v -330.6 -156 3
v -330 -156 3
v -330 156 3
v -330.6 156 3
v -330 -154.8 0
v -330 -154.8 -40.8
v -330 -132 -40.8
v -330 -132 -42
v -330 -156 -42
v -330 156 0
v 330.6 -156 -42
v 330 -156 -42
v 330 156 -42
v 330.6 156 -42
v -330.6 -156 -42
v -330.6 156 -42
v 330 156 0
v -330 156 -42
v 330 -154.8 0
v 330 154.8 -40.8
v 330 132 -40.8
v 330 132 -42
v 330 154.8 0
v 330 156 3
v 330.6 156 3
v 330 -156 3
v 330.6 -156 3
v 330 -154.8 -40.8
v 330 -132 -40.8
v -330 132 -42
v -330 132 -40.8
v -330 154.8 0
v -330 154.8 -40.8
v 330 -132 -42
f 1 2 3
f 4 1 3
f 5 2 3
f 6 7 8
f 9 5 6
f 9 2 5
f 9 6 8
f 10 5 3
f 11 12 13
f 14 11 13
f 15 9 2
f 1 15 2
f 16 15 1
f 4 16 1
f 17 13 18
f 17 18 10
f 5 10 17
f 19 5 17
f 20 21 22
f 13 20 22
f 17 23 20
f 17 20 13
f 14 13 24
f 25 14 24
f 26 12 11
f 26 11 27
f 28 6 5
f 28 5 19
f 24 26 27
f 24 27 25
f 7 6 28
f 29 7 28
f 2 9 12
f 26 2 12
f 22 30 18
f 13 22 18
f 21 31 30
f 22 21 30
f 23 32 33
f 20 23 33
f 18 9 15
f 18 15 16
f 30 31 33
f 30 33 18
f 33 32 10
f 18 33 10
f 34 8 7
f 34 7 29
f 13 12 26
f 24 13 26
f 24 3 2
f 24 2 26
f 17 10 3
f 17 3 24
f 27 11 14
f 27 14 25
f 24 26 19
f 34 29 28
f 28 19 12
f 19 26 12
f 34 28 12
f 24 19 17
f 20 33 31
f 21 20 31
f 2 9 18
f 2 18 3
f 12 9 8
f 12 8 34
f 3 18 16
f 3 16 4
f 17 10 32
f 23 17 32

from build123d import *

# Parameters (mm, degrees)
SKETCH_1_W            = 1100
SKETCH_1_H            = 520
EXTRUDE_1_DEPTH       = 5
THICKEN_START         = -550
THICKEN_1_DEPTH       = 1100
THICKEN_START_2       = -260
THICKEN_2_OUTLINE_W   = 1100
THICKEN_2_OUTLINE_H   = 70
THICKEN_2_DEPTH       = 2
THICKEN_START_3       = -258
THICKEN_2_2_OUTLINE_W = 1100
THICKEN_2_2_OUTLINE_H = 2
THICKEN_2_2_DEPTH     = 38
EXTRUDE_2_DEPTH       = 1
SCALE_1_SCALE         = 0.6


# Read off the part's stored shape, not the designer's step: 加厚1, 加厚2
with BuildPart() as part:
    # 草图1 → 凸台-拉伸1 (new body)
    with BuildSketch(Plane.XY):
        Rectangle(SKETCH_1_W, SKETCH_1_H)
    extrude(amount=EXTRUDE_1_DEPTH)

    # 加厚2 outline → 加厚2 (add)
    with BuildSketch(Plane(origin=(0, 0, 0), x_dir=(1, 0, 0), z_dir=(0, 1, 0)).offset(THICKEN_START_2)):
        with Locations((0, 35)):
            Rectangle(THICKEN_2_OUTLINE_W, THICKEN_2_OUTLINE_H)
    extrude(amount=THICKEN_2_DEPTH)

    # Thicken 2 2 outline → Thicken 2 2 (add)
    with BuildSketch(Plane(origin=(0, 0, 0), x_dir=(1, 0, 0), z_dir=(0, 1, 0)).offset(THICKEN_START_3)):
        with Locations((0, 69)):
            Rectangle(THICKEN_2_2_OUTLINE_W, THICKEN_2_2_OUTLINE_H)
    extrude(amount=THICKEN_2_2_DEPTH)


with BuildPart() as body_2:
    # 加厚1 outline → 加厚1 (new body)
    with BuildSketch(Plane.YZ.offset(THICKEN_START)):
        Polygon((260, -70), (260, 0), (258, 0), (258, -68), (220, -68), (220, -70), align=None)
    extrude(amount=THICKEN_1_DEPTH)


with BuildPart() as body_3:
    # 草图4 → 凸台-拉伸2 (new body)
    with BuildSketch(Plane(origin=(550, 0, 0), x_dir=(0, 0, -1), z_dir=(1, 0, 0))):
        Polygon((0, 260), (70, 260), (70, 220), (70, -220), (70, -260), (-5, -260), (-5, 260), align=None)
    extrude(amount=EXTRUDE_2_DEPTH)


with BuildPart() as body_4:
    # 镜向2: mirrored copy
    add(body_3.part.mirror(Plane(origin=(0, 0, 0), x_dir=(0, 0, 1), z_dir=(1, 0, 0))))


with BuildPart() as body_2_1:
    # 缩放比例1: scaled about (0, 0, 0)
    add(body_2.part.scale(SCALE_1_SCALE))


with BuildPart() as body_3_1:
    # 缩放比例1: scaled about (0, 0, 0)
    add(body_3.part.scale(SCALE_1_SCALE))


with BuildPart() as part_1:
    # 缩放比例1: scaled about (0, 0, 0)
    add(part.part.scale(SCALE_1_SCALE))


with BuildPart() as body_4_1:
    # 缩放比例1: scaled about (0, 0, 0)
    add(body_4.part.scale(SCALE_1_SCALE))


solid = Compound([body_2_1.part, body_3_1.part, part_1.part, body_4_1.part])
